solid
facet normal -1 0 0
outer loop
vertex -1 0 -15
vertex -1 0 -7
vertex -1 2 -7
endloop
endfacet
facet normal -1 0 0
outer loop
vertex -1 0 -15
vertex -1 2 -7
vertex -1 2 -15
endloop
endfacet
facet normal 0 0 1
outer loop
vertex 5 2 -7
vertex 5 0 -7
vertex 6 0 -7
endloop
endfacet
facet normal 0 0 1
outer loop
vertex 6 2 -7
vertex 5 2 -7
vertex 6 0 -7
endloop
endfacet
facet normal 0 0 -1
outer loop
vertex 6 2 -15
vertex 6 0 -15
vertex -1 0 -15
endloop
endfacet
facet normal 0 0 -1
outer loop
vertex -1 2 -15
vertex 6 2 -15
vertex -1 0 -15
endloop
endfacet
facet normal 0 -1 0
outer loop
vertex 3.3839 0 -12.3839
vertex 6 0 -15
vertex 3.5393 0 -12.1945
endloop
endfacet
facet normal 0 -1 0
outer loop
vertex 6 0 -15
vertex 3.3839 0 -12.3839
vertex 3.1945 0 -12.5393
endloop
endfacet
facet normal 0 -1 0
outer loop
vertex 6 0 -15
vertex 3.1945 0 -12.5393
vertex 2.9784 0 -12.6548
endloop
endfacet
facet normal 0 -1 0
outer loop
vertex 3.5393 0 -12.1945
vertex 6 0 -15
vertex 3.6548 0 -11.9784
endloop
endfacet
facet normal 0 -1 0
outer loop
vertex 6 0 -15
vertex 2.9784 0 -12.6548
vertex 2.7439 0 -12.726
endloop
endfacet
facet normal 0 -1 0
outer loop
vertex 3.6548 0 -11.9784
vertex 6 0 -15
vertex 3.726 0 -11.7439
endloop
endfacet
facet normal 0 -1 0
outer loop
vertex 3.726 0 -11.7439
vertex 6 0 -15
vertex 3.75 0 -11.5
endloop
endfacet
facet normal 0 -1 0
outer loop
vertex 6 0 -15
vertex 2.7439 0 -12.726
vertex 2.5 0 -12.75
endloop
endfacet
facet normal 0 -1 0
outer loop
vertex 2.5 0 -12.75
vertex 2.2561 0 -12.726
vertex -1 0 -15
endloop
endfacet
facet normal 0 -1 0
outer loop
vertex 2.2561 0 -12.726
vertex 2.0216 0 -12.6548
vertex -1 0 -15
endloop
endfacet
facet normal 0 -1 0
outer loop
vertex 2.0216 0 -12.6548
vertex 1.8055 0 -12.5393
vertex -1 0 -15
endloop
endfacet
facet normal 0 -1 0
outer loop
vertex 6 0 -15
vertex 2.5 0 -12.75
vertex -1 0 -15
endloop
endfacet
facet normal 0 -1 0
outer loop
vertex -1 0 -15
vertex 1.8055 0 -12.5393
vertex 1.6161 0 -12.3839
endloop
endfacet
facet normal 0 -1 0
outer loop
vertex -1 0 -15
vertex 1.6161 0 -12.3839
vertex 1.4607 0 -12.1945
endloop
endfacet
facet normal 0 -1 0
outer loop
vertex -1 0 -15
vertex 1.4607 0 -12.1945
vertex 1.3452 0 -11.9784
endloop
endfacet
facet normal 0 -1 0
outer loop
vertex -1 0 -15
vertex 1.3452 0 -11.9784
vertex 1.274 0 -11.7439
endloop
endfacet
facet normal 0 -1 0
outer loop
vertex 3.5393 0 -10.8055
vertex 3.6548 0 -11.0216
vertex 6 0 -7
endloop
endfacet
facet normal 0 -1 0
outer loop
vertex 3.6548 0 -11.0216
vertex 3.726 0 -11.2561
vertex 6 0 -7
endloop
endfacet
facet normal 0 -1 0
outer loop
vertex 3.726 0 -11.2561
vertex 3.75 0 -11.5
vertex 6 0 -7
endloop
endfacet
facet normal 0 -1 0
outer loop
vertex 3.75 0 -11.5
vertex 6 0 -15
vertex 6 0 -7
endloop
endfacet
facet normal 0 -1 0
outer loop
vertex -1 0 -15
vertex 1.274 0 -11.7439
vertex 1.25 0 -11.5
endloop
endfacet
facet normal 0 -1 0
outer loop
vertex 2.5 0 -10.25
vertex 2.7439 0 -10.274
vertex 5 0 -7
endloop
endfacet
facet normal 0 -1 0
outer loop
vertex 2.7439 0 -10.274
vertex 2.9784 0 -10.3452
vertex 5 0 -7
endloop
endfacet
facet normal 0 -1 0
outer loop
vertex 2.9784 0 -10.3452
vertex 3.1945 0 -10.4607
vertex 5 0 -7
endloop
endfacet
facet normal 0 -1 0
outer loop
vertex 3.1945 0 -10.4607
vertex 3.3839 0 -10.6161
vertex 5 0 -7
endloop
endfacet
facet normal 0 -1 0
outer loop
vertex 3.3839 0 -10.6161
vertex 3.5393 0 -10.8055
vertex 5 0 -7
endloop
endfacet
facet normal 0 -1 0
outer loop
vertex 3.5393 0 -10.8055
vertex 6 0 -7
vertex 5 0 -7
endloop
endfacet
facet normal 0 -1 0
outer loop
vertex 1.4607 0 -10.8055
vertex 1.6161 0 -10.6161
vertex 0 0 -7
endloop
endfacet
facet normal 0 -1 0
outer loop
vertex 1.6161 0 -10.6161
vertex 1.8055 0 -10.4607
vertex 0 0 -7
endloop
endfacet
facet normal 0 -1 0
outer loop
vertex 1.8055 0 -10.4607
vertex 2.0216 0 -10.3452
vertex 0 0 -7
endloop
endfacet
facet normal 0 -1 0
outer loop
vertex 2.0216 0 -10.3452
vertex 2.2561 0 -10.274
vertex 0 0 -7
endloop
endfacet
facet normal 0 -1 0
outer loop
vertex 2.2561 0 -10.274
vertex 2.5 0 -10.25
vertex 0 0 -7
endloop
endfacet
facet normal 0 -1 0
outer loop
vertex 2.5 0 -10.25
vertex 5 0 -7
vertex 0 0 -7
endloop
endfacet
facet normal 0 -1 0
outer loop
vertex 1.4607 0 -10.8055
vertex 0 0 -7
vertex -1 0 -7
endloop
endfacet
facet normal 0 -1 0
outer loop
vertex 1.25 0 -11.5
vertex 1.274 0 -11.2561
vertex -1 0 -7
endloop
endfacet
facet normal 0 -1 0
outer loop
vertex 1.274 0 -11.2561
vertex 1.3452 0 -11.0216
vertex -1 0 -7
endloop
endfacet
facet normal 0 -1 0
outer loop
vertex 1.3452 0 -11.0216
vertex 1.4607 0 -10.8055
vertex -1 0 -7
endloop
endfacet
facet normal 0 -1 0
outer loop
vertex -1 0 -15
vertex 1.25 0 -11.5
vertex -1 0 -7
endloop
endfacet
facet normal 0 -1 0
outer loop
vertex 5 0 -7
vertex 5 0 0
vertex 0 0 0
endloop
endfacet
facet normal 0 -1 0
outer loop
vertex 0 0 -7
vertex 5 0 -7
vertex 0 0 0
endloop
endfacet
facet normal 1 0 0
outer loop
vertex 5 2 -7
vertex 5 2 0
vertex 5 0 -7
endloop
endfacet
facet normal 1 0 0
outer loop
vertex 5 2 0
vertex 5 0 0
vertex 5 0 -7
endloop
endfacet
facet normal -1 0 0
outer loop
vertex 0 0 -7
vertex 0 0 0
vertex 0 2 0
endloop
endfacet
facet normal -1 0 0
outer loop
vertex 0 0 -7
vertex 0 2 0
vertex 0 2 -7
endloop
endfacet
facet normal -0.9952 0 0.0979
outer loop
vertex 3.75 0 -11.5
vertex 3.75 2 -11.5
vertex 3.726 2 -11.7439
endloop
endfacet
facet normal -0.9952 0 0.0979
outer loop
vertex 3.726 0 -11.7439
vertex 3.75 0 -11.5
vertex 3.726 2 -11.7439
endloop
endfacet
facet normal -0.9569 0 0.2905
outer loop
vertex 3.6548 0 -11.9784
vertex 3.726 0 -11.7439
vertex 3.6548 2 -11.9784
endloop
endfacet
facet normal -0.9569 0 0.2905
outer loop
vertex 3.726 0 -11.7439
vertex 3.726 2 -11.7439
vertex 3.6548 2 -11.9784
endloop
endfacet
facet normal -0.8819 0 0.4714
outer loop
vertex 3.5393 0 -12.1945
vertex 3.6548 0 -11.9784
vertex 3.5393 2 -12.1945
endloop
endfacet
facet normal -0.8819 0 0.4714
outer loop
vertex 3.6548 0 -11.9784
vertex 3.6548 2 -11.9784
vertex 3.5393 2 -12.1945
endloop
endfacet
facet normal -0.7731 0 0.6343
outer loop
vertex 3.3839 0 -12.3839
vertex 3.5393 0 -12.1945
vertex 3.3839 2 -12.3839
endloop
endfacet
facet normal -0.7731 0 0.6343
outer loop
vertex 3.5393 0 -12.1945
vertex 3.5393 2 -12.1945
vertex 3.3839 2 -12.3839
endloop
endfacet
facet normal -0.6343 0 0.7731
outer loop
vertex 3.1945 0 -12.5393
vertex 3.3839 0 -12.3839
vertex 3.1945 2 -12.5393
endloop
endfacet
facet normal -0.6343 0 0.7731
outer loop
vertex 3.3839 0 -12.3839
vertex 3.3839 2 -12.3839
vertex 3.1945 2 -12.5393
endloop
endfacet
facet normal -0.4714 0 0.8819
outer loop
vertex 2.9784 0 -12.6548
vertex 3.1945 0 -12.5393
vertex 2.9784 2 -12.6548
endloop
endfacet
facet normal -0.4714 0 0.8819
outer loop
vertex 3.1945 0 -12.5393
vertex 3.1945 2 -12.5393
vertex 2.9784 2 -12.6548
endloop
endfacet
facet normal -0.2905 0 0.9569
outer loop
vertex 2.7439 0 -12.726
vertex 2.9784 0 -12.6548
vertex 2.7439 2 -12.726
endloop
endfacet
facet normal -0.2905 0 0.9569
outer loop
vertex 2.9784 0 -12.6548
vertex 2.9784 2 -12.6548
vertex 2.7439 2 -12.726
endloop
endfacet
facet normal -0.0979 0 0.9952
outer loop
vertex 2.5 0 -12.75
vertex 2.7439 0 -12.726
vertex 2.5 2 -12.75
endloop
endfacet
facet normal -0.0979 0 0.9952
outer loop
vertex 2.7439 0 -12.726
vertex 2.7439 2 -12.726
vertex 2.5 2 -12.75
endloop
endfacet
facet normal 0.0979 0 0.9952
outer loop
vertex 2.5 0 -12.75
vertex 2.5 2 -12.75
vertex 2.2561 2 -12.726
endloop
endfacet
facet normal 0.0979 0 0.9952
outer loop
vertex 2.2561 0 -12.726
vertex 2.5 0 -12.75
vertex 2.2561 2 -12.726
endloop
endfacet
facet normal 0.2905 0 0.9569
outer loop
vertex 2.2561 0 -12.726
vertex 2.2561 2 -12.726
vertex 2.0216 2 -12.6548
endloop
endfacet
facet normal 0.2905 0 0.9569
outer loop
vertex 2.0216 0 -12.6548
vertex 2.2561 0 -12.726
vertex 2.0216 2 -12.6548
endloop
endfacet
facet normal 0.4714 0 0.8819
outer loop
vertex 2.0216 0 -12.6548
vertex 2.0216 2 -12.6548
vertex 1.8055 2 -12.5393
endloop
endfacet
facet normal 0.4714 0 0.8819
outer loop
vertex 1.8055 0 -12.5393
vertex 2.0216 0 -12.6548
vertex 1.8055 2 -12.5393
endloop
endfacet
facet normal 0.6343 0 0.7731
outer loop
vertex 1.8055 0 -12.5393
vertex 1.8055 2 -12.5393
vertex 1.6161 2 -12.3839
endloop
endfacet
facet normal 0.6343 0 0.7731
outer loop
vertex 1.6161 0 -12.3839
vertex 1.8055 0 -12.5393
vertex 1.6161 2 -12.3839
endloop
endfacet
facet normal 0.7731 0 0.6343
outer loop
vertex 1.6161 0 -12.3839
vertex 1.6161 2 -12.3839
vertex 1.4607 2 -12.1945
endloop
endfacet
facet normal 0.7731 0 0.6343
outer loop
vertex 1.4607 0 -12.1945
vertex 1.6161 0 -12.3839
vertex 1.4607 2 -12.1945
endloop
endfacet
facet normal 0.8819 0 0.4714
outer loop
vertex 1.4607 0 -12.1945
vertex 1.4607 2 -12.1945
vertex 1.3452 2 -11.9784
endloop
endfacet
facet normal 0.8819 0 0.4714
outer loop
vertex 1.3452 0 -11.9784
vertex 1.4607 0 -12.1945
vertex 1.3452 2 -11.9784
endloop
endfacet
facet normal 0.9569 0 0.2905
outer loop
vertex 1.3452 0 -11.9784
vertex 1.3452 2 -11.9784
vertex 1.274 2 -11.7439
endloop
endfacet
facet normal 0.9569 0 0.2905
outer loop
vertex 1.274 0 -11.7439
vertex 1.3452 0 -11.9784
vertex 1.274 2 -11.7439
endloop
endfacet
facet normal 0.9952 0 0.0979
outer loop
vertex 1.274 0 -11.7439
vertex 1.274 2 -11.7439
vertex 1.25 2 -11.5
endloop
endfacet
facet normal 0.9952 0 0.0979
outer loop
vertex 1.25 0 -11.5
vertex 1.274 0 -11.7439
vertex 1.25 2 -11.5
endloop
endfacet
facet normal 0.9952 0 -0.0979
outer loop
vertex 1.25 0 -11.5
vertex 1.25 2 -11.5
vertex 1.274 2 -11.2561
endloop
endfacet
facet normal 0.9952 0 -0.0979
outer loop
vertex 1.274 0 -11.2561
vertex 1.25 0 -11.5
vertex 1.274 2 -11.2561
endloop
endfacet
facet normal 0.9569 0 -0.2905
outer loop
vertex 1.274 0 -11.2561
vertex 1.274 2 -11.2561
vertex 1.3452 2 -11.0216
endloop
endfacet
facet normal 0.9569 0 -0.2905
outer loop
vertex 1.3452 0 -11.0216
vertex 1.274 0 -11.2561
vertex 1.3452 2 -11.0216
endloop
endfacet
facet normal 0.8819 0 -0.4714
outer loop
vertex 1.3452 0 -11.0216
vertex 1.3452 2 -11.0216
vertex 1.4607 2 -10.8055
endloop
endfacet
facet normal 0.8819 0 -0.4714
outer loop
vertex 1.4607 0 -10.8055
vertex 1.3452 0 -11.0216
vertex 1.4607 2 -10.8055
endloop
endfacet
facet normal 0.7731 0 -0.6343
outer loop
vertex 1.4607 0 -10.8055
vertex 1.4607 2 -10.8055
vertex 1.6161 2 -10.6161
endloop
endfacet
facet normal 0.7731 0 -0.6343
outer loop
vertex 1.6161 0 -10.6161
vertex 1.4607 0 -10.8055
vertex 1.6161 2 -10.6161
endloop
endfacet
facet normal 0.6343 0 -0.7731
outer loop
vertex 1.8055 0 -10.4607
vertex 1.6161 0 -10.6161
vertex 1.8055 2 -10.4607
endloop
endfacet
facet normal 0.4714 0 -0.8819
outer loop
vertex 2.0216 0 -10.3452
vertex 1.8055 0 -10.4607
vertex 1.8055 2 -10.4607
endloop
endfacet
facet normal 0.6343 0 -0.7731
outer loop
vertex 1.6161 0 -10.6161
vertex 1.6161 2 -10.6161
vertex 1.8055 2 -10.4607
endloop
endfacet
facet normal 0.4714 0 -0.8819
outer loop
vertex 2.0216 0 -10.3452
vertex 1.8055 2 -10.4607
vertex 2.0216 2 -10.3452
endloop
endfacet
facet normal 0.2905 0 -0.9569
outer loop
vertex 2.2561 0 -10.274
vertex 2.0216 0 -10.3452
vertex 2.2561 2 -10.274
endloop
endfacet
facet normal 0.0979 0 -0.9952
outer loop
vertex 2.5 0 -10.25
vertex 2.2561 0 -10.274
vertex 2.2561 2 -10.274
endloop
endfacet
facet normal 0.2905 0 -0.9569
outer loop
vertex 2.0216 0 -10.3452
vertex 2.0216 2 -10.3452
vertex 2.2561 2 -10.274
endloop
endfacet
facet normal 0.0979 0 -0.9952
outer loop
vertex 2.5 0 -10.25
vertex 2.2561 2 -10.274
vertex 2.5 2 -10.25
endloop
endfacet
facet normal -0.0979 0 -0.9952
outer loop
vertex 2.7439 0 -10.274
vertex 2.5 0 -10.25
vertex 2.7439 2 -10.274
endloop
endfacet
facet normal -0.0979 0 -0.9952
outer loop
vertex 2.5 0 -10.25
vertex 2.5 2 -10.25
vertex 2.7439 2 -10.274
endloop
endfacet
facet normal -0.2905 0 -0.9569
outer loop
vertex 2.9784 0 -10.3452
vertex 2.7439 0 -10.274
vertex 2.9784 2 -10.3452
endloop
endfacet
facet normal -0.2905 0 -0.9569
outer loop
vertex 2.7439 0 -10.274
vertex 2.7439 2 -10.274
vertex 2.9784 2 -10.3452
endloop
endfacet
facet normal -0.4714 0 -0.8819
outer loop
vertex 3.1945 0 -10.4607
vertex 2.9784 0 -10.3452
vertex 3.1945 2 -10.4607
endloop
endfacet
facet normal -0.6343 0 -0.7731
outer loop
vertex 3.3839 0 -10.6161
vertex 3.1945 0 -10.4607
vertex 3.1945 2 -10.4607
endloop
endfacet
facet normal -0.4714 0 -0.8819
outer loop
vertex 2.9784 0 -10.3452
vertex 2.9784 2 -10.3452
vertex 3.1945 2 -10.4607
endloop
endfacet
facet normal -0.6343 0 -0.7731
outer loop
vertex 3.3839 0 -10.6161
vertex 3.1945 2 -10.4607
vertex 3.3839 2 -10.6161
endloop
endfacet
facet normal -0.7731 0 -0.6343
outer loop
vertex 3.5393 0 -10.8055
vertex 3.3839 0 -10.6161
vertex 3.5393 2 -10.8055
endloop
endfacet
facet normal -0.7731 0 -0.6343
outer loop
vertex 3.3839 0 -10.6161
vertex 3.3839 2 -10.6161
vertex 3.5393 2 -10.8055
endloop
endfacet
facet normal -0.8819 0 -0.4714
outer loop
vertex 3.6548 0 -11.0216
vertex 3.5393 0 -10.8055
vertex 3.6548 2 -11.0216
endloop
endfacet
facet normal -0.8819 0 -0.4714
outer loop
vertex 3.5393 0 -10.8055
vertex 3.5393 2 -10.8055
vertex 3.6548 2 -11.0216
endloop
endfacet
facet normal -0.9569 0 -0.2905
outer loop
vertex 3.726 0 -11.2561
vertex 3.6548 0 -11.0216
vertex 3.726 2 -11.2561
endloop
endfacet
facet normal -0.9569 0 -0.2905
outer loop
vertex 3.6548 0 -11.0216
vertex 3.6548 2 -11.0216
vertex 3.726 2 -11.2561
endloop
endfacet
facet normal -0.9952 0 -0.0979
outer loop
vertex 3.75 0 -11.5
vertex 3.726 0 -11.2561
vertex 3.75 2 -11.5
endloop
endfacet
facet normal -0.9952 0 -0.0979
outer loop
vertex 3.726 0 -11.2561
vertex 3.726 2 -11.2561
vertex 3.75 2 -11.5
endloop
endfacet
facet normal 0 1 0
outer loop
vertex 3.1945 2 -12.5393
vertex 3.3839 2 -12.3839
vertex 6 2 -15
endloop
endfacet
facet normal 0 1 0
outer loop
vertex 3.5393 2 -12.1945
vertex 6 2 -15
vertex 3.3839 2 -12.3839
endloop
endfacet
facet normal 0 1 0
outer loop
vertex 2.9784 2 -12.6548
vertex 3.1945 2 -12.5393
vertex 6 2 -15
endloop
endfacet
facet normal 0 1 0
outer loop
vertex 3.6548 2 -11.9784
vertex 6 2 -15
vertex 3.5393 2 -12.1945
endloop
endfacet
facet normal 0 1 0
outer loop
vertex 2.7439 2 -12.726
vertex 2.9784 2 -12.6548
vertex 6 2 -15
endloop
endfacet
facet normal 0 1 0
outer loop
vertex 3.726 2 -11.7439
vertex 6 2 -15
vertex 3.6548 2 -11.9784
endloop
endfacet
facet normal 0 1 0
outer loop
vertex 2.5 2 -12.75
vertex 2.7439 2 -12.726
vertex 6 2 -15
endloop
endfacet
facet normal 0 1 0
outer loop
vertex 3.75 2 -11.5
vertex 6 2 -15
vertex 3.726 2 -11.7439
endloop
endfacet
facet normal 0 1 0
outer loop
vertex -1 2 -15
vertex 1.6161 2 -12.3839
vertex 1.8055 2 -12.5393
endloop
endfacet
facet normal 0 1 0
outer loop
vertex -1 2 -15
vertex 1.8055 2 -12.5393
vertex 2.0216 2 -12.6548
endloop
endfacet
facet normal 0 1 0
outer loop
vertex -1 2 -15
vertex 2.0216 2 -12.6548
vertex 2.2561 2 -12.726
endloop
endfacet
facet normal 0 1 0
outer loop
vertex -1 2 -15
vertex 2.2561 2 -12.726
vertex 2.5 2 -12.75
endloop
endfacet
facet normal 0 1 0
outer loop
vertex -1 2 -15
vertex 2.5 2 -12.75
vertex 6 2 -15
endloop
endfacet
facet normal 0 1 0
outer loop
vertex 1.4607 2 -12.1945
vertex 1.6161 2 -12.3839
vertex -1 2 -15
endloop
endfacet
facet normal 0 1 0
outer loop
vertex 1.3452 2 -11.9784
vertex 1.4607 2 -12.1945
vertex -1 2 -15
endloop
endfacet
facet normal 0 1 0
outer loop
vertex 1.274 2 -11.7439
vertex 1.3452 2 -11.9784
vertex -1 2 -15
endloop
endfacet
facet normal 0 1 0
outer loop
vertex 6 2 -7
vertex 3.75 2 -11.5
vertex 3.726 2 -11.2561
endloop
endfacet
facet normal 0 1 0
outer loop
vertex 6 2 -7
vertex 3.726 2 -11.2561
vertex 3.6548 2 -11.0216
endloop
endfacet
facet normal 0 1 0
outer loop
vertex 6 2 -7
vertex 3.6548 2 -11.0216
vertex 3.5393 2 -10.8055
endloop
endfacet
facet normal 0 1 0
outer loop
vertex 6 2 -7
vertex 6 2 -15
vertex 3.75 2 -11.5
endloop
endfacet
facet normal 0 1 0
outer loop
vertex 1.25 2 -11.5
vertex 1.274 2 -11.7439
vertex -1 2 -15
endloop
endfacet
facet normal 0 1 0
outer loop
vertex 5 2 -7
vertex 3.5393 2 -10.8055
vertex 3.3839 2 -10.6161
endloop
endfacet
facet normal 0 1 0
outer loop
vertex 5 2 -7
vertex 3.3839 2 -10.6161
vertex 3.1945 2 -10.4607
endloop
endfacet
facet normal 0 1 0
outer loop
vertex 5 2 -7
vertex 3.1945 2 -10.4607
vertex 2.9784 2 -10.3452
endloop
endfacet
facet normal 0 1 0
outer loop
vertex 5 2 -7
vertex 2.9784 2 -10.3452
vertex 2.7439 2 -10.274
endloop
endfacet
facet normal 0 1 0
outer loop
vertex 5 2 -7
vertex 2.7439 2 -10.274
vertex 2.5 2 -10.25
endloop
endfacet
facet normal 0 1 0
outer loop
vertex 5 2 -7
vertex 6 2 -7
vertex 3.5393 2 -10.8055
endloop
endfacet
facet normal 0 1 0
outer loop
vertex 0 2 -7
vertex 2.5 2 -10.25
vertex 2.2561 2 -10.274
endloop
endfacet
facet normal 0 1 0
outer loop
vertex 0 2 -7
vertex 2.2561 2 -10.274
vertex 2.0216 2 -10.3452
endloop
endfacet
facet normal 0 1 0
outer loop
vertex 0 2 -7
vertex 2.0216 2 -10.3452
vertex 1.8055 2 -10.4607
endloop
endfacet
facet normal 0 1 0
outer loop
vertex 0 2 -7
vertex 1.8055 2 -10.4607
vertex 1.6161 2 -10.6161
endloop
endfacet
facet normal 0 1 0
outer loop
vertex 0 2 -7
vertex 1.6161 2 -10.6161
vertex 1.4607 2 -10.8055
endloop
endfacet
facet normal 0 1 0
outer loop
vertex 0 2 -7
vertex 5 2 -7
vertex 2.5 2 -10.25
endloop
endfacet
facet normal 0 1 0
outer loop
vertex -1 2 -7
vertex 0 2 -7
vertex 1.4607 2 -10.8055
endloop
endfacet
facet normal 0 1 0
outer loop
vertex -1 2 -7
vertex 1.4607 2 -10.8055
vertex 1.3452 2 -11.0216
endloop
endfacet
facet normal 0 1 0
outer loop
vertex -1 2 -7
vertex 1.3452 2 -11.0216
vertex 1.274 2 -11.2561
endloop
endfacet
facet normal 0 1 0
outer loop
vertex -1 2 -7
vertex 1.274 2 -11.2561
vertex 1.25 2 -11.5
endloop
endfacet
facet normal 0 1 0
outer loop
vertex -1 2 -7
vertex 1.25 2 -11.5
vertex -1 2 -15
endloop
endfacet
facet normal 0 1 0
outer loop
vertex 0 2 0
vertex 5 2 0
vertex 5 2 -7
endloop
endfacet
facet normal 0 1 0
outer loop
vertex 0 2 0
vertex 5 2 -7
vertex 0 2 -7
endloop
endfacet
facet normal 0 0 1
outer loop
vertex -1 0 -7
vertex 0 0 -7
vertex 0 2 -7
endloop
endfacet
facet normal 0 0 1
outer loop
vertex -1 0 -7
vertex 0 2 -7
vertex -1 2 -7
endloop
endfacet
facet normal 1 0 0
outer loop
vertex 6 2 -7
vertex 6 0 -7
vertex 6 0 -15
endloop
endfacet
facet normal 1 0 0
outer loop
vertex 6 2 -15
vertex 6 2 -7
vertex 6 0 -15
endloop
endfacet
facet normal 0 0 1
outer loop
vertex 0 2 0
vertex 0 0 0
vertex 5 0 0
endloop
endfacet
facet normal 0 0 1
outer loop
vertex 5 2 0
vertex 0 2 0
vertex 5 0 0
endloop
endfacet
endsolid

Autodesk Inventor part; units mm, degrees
ref_plane "YZ Plane" through (0, 0, 0) normal (1, 0, 0) x (0, 1, 0)
ref_plane "XZ Plane" through (0, 0, 0) normal (0, 1, 0) x (-1, 0, 0)
ref_plane "XY Plane" through (0, 0, 0) normal (0, 0, 1) x (1, 0, 0)
sketch "Sketch3" plane through (0, 0, 0) normal (0, 1, 0) x (-1, 0, 0)
  line L0 (0, 0) -> (-5, 0)
  line L1 (-5, 0) -> (-5, -7)
  line L2 (0, 0) -> (0, -7)
  line L3 (0, -7) -> (1, -7)
  line L4 (1, -7) -> (1, -15)
  line L5 (-5, -7) -> (-6, -7)
  line L6 (-6, -7) -> (-6, -15)
  line L7 (-6, -15) -> (1, -15)
  dimension "d9" = 5
  dimension "d10" = 7
  dimension "d11" = 1
  dimension "d12" = 8
  dimension "d13" = 1
extrude "Extrusion3" add sketch "Sketch3" along normal blind 2
sketch "Sketch4" plane through (0, 2, 0) normal (0, 1, 0) x (1, 0, 0)
  line L0 (-1, 15) -> (-1, 7) projected
  line L1 (-1, 15) -> (2.5, 15)
  line L2 (6, 15) -> (-1, 15) projected
  line L3 (2.5, 15) -> (2.5, 11.5)
  circle A0 centre (2.5, 11.5) radius 1.25
  point P0 (0, 0)
  dimension "d16" = 3.5
  dimension "d17" = 3.5
  dimension "d18" = 2.5
extrude "Extrusion4" cut sketch "Sketch4" against normal blind 2
properties part number "HINGE A"
